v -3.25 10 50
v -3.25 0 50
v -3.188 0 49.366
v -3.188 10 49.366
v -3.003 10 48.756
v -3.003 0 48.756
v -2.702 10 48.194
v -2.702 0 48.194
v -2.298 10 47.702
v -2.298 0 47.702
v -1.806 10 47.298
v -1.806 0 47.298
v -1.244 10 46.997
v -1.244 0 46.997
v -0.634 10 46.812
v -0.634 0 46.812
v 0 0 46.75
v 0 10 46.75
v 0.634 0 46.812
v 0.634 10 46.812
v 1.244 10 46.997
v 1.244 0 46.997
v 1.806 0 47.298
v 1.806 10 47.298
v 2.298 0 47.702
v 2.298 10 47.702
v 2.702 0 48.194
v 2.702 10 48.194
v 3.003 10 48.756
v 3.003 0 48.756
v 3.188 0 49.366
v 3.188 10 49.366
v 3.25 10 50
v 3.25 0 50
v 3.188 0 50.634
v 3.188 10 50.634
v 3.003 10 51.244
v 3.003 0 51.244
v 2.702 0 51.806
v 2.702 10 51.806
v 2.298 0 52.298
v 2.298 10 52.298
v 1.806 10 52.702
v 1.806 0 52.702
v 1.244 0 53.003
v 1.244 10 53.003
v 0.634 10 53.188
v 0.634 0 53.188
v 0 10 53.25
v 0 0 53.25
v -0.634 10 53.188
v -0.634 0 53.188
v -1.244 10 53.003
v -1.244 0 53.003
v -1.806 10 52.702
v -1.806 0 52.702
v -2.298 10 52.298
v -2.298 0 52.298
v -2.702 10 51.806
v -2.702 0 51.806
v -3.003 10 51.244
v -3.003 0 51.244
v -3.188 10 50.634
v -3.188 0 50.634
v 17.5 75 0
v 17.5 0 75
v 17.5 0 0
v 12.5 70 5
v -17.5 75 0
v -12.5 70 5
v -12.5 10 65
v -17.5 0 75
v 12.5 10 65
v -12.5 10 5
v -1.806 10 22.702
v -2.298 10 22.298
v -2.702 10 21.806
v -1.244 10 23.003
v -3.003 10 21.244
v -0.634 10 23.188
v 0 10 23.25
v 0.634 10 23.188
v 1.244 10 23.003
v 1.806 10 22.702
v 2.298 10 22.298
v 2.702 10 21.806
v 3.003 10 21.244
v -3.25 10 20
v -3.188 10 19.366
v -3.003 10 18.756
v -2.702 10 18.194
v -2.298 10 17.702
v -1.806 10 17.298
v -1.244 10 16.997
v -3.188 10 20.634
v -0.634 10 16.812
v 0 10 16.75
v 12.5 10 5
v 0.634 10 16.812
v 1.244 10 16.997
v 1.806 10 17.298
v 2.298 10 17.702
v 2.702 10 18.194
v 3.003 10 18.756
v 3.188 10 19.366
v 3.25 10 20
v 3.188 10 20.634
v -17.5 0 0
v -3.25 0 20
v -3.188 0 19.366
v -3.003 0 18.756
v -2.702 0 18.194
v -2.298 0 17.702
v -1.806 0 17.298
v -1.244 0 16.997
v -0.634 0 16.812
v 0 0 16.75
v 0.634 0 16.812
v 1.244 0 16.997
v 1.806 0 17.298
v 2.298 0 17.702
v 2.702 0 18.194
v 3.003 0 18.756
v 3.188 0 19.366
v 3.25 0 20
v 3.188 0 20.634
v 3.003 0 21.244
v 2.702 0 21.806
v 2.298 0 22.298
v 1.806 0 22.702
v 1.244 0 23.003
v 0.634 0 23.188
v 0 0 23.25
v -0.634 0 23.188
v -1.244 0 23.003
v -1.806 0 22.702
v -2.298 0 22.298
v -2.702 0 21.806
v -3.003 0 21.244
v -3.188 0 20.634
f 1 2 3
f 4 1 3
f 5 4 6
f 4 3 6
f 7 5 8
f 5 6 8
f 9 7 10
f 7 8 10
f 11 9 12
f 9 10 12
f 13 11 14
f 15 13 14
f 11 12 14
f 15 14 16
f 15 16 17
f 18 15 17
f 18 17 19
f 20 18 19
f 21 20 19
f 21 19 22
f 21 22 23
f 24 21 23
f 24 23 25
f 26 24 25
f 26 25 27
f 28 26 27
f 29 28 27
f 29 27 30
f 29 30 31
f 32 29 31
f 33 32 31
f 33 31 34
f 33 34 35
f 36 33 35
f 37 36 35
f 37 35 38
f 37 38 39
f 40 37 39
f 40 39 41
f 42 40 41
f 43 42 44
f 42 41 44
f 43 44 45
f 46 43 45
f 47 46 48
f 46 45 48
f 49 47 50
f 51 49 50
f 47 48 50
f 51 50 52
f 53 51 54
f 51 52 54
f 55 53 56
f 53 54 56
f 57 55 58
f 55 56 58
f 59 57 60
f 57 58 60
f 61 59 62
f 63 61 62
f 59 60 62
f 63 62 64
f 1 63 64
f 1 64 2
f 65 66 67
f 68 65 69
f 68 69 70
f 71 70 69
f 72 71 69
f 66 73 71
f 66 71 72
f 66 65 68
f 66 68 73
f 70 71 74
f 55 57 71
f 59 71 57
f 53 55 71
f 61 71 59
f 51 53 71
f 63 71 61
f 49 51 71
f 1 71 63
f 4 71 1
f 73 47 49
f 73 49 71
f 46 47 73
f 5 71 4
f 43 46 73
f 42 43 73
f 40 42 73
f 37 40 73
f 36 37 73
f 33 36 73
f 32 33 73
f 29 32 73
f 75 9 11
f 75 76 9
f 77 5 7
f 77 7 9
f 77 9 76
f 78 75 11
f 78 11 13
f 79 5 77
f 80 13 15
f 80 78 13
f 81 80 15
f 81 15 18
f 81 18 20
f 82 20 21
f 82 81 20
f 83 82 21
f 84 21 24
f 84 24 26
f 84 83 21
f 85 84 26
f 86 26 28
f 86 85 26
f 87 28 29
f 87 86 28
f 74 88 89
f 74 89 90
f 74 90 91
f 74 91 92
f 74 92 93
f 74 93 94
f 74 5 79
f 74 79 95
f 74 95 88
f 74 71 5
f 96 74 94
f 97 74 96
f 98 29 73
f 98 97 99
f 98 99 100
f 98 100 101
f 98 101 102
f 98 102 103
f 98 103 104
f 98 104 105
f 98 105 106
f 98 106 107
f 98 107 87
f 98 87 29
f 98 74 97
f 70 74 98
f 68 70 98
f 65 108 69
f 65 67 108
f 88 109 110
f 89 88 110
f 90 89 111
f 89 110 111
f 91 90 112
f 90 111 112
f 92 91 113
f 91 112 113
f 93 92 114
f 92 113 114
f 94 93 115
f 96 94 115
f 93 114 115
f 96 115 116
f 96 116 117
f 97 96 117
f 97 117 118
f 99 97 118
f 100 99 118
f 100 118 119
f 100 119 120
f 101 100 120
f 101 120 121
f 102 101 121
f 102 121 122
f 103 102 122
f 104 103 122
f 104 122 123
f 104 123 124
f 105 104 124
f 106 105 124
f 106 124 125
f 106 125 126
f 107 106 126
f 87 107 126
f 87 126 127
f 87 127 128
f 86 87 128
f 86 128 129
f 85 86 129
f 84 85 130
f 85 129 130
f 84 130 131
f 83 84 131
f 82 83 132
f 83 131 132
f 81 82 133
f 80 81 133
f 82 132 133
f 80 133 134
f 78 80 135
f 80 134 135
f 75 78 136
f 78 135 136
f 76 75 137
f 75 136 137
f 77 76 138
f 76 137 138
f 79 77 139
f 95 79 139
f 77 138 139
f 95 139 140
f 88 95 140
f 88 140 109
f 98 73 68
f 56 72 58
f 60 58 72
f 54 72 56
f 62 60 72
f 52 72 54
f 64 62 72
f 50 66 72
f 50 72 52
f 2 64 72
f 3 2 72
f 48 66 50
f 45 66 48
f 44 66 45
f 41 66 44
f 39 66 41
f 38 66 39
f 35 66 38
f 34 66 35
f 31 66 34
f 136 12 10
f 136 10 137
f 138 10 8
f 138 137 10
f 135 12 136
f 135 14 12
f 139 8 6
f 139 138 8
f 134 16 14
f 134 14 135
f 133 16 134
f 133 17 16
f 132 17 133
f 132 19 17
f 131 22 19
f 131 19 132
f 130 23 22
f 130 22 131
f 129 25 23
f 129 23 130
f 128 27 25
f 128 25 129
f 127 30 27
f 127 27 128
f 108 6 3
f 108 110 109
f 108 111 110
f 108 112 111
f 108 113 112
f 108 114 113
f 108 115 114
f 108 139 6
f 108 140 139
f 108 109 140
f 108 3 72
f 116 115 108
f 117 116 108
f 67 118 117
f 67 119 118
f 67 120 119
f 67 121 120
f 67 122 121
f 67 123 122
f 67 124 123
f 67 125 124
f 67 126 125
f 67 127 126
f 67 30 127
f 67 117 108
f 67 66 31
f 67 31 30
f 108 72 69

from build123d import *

# Parameters (mm, degrees)
BOSS_EXTRUDE1_DEPTH   = 17.5
CUT_EXTRUDE1_START    = 10
SKETCH2_W             = 25
SKETCH2_H             = 70
CUT_EXTRUDE1_DEPTH    = 98.5
F_6_0MM_DOWEL_HOLE1_D = 6.5


with BuildPart() as part:
    # Sketch1 → Boss-Extrude1 (new, symmetric)
    with BuildSketch(Plane(origin=(0, 0, 0), x_dir=(0, 0, -1), z_dir=(1, 0, 0))):
        Polygon((0, 0), (0, 75), (-75, 0), align=None)
    extrude(amount=BOSS_EXTRUDE1_DEPTH, both=True)

    # Sketch2 → Cut-Extrude1 (cut, through all)
    with BuildSketch(Plane(origin=(0, 0, 0), x_dir=(1, 0, 0), z_dir=(0, 1, 0)).offset(CUT_EXTRUDE1_START)):
        with Locations((0, -40)):
            Rectangle(SKETCH2_W, SKETCH2_H)
    extrude(amount=CUT_EXTRUDE1_DEPTH, mode=Mode.SUBTRACT)

    # Ø6.0mm Dowel Hole1 (through all)
    with Locations(Plane(origin=(0, 10, 0), x_dir=(1, 0, 0), z_dir=(0, 1, 0))):
        with Locations((0, -20), (0, -50)):
            Hole(F_6_0MM_DOWEL_HOLE1_D / 2)


solid = part.part
